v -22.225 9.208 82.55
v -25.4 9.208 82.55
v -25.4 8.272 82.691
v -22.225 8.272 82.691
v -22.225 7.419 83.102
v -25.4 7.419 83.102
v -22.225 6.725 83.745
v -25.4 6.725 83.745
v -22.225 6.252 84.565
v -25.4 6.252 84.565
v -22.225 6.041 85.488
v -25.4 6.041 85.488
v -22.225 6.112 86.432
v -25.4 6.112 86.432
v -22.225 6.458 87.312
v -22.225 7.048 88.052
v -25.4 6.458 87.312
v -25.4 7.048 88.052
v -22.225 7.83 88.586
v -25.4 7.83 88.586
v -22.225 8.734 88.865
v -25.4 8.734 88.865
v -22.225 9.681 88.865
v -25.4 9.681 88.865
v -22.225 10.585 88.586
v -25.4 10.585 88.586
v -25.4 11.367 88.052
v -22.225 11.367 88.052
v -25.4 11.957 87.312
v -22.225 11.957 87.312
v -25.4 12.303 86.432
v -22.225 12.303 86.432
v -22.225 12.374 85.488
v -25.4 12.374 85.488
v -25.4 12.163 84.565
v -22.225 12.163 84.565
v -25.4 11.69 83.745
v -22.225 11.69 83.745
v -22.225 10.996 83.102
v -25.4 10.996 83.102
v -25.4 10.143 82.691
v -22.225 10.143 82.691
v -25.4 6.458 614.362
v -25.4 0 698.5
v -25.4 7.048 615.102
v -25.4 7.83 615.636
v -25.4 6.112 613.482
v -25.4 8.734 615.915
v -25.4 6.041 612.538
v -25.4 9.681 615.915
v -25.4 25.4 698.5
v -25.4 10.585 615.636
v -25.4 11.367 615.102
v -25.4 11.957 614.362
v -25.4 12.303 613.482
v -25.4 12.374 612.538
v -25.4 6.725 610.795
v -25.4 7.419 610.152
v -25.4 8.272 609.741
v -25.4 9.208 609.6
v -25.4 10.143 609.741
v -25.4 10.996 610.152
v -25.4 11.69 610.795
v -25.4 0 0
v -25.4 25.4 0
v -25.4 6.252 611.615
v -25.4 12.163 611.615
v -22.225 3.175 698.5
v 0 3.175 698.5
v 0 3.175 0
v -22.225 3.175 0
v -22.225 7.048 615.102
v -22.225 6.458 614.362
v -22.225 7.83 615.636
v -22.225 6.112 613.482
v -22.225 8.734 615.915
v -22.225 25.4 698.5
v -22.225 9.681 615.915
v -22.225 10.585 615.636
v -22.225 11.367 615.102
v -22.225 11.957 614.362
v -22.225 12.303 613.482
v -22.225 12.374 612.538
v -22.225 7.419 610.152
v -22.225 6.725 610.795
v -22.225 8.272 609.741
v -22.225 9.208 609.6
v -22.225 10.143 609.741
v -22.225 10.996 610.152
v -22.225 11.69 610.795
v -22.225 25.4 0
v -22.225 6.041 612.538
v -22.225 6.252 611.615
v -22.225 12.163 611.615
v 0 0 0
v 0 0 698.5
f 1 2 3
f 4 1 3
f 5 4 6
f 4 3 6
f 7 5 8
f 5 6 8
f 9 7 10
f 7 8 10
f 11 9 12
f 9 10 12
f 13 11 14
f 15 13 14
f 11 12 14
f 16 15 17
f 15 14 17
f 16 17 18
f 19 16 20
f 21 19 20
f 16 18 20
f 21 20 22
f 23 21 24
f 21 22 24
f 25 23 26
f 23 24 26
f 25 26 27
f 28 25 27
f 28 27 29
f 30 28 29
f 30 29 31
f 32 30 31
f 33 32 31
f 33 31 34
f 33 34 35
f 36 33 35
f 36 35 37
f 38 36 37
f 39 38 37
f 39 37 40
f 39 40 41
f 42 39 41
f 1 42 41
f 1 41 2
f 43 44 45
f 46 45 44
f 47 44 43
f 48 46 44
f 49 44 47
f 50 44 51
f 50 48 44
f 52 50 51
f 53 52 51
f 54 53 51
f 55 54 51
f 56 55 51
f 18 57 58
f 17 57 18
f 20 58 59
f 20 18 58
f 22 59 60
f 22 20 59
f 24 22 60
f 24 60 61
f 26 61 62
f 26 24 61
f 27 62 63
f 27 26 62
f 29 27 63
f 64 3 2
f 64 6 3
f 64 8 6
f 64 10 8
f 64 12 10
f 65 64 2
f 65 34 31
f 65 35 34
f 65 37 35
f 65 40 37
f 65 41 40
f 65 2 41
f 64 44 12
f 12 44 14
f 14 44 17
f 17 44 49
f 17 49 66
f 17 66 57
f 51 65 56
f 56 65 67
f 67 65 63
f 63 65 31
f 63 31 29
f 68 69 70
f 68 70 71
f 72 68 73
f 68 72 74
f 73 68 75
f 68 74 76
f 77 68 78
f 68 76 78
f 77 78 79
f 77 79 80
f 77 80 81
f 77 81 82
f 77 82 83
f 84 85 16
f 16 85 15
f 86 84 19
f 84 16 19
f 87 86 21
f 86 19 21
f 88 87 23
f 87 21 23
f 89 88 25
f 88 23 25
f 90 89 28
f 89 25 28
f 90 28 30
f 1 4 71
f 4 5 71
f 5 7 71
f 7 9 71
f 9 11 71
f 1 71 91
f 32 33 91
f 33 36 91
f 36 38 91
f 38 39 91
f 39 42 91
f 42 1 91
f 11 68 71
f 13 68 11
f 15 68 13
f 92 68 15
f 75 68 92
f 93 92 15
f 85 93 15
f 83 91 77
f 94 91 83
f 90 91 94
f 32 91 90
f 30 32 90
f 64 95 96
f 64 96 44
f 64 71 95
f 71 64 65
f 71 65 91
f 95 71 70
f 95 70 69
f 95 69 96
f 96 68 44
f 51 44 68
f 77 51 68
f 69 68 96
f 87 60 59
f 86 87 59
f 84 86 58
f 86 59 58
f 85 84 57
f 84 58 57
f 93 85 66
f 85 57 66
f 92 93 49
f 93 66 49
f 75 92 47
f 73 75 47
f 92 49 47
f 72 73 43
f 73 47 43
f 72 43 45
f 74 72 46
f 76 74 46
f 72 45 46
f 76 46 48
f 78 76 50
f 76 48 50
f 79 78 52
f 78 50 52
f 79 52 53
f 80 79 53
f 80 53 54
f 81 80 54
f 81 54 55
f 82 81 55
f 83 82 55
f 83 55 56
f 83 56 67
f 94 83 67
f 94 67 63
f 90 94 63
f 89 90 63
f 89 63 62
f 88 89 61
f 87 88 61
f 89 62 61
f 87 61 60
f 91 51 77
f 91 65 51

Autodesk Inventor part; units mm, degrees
ref_plane "YZ Plane" through (0, 0, 0) normal (1, 0, 0) x (0, 1, 0)
ref_plane "XZ Plane" through (0, 0, 0) normal (0, 1, 0) x (-1, 0, 0)
ref_plane "XY Plane" through (0, 0, 0) normal (0, 0, 1) x (1, 0, 0)
sketch "Sketch1" plane through (0, 0, 0) normal (0, 0, 1) x (1, 0, 0)
  line L0 (0, 0) -> (-25.4, 0)
  line L1 (-25.4, 0) -> (-25.4, 25.4)
  line L2 (0, 3.175) -> (-22.225, 3.175)
  line L3 (-22.225, 3.175) -> (-22.225, 25.4)
  line L4 (0, 3.175) -> (0, 0)
  line L5 (-25.4, 25.4) -> (-22.225, 25.4)
  dimension "d0" = 25.4
  dimension "d1" = 25.4
  dimension "d2" = 3.175
extrude "Extrusion1" add sketch "Sketch1" along normal blind 698.5
sketch "Sketch2" plane through (-22.225, 3.175, 0) normal (1, 0, 0) x (0, 0, -1)
  line L0 (0, 22.225) -> (0, 0) projected
  line L1 (0, 11.1125) -> (0, 6.0325)
  line L2 (0, 6.0325) -> (-85.725, 6.0325)
  line L3 (0, 22.225) -> (-698.5, 22.225) projected
  line L4 (-349.25, 22.225) -> (-349.25, 11.1125)
  line L5 (-698.5, 22.225) -> (-698.5, 0)
  line L6 (-698.5, 11.1125) -> (-698.5, 6.0325)
  line L7 (-698.5, 6.0325) -> (-612.775, 6.0325)
  line L8 (-698.5, 22.225) -> (0, 22.225)
  point P0 (0, -3.175)
  point P1 (-698.5, -3.175)
  dimension "d5" = 5.08
  dimension "d6" = 85.725
hole "Hole1" at (-22.225, 9.2075, 612.775) at (-22.225, 9.2075, 85.725) direction (-1, 0, 0) diameter 6.35 end through all
properties part number "27.5 L"
